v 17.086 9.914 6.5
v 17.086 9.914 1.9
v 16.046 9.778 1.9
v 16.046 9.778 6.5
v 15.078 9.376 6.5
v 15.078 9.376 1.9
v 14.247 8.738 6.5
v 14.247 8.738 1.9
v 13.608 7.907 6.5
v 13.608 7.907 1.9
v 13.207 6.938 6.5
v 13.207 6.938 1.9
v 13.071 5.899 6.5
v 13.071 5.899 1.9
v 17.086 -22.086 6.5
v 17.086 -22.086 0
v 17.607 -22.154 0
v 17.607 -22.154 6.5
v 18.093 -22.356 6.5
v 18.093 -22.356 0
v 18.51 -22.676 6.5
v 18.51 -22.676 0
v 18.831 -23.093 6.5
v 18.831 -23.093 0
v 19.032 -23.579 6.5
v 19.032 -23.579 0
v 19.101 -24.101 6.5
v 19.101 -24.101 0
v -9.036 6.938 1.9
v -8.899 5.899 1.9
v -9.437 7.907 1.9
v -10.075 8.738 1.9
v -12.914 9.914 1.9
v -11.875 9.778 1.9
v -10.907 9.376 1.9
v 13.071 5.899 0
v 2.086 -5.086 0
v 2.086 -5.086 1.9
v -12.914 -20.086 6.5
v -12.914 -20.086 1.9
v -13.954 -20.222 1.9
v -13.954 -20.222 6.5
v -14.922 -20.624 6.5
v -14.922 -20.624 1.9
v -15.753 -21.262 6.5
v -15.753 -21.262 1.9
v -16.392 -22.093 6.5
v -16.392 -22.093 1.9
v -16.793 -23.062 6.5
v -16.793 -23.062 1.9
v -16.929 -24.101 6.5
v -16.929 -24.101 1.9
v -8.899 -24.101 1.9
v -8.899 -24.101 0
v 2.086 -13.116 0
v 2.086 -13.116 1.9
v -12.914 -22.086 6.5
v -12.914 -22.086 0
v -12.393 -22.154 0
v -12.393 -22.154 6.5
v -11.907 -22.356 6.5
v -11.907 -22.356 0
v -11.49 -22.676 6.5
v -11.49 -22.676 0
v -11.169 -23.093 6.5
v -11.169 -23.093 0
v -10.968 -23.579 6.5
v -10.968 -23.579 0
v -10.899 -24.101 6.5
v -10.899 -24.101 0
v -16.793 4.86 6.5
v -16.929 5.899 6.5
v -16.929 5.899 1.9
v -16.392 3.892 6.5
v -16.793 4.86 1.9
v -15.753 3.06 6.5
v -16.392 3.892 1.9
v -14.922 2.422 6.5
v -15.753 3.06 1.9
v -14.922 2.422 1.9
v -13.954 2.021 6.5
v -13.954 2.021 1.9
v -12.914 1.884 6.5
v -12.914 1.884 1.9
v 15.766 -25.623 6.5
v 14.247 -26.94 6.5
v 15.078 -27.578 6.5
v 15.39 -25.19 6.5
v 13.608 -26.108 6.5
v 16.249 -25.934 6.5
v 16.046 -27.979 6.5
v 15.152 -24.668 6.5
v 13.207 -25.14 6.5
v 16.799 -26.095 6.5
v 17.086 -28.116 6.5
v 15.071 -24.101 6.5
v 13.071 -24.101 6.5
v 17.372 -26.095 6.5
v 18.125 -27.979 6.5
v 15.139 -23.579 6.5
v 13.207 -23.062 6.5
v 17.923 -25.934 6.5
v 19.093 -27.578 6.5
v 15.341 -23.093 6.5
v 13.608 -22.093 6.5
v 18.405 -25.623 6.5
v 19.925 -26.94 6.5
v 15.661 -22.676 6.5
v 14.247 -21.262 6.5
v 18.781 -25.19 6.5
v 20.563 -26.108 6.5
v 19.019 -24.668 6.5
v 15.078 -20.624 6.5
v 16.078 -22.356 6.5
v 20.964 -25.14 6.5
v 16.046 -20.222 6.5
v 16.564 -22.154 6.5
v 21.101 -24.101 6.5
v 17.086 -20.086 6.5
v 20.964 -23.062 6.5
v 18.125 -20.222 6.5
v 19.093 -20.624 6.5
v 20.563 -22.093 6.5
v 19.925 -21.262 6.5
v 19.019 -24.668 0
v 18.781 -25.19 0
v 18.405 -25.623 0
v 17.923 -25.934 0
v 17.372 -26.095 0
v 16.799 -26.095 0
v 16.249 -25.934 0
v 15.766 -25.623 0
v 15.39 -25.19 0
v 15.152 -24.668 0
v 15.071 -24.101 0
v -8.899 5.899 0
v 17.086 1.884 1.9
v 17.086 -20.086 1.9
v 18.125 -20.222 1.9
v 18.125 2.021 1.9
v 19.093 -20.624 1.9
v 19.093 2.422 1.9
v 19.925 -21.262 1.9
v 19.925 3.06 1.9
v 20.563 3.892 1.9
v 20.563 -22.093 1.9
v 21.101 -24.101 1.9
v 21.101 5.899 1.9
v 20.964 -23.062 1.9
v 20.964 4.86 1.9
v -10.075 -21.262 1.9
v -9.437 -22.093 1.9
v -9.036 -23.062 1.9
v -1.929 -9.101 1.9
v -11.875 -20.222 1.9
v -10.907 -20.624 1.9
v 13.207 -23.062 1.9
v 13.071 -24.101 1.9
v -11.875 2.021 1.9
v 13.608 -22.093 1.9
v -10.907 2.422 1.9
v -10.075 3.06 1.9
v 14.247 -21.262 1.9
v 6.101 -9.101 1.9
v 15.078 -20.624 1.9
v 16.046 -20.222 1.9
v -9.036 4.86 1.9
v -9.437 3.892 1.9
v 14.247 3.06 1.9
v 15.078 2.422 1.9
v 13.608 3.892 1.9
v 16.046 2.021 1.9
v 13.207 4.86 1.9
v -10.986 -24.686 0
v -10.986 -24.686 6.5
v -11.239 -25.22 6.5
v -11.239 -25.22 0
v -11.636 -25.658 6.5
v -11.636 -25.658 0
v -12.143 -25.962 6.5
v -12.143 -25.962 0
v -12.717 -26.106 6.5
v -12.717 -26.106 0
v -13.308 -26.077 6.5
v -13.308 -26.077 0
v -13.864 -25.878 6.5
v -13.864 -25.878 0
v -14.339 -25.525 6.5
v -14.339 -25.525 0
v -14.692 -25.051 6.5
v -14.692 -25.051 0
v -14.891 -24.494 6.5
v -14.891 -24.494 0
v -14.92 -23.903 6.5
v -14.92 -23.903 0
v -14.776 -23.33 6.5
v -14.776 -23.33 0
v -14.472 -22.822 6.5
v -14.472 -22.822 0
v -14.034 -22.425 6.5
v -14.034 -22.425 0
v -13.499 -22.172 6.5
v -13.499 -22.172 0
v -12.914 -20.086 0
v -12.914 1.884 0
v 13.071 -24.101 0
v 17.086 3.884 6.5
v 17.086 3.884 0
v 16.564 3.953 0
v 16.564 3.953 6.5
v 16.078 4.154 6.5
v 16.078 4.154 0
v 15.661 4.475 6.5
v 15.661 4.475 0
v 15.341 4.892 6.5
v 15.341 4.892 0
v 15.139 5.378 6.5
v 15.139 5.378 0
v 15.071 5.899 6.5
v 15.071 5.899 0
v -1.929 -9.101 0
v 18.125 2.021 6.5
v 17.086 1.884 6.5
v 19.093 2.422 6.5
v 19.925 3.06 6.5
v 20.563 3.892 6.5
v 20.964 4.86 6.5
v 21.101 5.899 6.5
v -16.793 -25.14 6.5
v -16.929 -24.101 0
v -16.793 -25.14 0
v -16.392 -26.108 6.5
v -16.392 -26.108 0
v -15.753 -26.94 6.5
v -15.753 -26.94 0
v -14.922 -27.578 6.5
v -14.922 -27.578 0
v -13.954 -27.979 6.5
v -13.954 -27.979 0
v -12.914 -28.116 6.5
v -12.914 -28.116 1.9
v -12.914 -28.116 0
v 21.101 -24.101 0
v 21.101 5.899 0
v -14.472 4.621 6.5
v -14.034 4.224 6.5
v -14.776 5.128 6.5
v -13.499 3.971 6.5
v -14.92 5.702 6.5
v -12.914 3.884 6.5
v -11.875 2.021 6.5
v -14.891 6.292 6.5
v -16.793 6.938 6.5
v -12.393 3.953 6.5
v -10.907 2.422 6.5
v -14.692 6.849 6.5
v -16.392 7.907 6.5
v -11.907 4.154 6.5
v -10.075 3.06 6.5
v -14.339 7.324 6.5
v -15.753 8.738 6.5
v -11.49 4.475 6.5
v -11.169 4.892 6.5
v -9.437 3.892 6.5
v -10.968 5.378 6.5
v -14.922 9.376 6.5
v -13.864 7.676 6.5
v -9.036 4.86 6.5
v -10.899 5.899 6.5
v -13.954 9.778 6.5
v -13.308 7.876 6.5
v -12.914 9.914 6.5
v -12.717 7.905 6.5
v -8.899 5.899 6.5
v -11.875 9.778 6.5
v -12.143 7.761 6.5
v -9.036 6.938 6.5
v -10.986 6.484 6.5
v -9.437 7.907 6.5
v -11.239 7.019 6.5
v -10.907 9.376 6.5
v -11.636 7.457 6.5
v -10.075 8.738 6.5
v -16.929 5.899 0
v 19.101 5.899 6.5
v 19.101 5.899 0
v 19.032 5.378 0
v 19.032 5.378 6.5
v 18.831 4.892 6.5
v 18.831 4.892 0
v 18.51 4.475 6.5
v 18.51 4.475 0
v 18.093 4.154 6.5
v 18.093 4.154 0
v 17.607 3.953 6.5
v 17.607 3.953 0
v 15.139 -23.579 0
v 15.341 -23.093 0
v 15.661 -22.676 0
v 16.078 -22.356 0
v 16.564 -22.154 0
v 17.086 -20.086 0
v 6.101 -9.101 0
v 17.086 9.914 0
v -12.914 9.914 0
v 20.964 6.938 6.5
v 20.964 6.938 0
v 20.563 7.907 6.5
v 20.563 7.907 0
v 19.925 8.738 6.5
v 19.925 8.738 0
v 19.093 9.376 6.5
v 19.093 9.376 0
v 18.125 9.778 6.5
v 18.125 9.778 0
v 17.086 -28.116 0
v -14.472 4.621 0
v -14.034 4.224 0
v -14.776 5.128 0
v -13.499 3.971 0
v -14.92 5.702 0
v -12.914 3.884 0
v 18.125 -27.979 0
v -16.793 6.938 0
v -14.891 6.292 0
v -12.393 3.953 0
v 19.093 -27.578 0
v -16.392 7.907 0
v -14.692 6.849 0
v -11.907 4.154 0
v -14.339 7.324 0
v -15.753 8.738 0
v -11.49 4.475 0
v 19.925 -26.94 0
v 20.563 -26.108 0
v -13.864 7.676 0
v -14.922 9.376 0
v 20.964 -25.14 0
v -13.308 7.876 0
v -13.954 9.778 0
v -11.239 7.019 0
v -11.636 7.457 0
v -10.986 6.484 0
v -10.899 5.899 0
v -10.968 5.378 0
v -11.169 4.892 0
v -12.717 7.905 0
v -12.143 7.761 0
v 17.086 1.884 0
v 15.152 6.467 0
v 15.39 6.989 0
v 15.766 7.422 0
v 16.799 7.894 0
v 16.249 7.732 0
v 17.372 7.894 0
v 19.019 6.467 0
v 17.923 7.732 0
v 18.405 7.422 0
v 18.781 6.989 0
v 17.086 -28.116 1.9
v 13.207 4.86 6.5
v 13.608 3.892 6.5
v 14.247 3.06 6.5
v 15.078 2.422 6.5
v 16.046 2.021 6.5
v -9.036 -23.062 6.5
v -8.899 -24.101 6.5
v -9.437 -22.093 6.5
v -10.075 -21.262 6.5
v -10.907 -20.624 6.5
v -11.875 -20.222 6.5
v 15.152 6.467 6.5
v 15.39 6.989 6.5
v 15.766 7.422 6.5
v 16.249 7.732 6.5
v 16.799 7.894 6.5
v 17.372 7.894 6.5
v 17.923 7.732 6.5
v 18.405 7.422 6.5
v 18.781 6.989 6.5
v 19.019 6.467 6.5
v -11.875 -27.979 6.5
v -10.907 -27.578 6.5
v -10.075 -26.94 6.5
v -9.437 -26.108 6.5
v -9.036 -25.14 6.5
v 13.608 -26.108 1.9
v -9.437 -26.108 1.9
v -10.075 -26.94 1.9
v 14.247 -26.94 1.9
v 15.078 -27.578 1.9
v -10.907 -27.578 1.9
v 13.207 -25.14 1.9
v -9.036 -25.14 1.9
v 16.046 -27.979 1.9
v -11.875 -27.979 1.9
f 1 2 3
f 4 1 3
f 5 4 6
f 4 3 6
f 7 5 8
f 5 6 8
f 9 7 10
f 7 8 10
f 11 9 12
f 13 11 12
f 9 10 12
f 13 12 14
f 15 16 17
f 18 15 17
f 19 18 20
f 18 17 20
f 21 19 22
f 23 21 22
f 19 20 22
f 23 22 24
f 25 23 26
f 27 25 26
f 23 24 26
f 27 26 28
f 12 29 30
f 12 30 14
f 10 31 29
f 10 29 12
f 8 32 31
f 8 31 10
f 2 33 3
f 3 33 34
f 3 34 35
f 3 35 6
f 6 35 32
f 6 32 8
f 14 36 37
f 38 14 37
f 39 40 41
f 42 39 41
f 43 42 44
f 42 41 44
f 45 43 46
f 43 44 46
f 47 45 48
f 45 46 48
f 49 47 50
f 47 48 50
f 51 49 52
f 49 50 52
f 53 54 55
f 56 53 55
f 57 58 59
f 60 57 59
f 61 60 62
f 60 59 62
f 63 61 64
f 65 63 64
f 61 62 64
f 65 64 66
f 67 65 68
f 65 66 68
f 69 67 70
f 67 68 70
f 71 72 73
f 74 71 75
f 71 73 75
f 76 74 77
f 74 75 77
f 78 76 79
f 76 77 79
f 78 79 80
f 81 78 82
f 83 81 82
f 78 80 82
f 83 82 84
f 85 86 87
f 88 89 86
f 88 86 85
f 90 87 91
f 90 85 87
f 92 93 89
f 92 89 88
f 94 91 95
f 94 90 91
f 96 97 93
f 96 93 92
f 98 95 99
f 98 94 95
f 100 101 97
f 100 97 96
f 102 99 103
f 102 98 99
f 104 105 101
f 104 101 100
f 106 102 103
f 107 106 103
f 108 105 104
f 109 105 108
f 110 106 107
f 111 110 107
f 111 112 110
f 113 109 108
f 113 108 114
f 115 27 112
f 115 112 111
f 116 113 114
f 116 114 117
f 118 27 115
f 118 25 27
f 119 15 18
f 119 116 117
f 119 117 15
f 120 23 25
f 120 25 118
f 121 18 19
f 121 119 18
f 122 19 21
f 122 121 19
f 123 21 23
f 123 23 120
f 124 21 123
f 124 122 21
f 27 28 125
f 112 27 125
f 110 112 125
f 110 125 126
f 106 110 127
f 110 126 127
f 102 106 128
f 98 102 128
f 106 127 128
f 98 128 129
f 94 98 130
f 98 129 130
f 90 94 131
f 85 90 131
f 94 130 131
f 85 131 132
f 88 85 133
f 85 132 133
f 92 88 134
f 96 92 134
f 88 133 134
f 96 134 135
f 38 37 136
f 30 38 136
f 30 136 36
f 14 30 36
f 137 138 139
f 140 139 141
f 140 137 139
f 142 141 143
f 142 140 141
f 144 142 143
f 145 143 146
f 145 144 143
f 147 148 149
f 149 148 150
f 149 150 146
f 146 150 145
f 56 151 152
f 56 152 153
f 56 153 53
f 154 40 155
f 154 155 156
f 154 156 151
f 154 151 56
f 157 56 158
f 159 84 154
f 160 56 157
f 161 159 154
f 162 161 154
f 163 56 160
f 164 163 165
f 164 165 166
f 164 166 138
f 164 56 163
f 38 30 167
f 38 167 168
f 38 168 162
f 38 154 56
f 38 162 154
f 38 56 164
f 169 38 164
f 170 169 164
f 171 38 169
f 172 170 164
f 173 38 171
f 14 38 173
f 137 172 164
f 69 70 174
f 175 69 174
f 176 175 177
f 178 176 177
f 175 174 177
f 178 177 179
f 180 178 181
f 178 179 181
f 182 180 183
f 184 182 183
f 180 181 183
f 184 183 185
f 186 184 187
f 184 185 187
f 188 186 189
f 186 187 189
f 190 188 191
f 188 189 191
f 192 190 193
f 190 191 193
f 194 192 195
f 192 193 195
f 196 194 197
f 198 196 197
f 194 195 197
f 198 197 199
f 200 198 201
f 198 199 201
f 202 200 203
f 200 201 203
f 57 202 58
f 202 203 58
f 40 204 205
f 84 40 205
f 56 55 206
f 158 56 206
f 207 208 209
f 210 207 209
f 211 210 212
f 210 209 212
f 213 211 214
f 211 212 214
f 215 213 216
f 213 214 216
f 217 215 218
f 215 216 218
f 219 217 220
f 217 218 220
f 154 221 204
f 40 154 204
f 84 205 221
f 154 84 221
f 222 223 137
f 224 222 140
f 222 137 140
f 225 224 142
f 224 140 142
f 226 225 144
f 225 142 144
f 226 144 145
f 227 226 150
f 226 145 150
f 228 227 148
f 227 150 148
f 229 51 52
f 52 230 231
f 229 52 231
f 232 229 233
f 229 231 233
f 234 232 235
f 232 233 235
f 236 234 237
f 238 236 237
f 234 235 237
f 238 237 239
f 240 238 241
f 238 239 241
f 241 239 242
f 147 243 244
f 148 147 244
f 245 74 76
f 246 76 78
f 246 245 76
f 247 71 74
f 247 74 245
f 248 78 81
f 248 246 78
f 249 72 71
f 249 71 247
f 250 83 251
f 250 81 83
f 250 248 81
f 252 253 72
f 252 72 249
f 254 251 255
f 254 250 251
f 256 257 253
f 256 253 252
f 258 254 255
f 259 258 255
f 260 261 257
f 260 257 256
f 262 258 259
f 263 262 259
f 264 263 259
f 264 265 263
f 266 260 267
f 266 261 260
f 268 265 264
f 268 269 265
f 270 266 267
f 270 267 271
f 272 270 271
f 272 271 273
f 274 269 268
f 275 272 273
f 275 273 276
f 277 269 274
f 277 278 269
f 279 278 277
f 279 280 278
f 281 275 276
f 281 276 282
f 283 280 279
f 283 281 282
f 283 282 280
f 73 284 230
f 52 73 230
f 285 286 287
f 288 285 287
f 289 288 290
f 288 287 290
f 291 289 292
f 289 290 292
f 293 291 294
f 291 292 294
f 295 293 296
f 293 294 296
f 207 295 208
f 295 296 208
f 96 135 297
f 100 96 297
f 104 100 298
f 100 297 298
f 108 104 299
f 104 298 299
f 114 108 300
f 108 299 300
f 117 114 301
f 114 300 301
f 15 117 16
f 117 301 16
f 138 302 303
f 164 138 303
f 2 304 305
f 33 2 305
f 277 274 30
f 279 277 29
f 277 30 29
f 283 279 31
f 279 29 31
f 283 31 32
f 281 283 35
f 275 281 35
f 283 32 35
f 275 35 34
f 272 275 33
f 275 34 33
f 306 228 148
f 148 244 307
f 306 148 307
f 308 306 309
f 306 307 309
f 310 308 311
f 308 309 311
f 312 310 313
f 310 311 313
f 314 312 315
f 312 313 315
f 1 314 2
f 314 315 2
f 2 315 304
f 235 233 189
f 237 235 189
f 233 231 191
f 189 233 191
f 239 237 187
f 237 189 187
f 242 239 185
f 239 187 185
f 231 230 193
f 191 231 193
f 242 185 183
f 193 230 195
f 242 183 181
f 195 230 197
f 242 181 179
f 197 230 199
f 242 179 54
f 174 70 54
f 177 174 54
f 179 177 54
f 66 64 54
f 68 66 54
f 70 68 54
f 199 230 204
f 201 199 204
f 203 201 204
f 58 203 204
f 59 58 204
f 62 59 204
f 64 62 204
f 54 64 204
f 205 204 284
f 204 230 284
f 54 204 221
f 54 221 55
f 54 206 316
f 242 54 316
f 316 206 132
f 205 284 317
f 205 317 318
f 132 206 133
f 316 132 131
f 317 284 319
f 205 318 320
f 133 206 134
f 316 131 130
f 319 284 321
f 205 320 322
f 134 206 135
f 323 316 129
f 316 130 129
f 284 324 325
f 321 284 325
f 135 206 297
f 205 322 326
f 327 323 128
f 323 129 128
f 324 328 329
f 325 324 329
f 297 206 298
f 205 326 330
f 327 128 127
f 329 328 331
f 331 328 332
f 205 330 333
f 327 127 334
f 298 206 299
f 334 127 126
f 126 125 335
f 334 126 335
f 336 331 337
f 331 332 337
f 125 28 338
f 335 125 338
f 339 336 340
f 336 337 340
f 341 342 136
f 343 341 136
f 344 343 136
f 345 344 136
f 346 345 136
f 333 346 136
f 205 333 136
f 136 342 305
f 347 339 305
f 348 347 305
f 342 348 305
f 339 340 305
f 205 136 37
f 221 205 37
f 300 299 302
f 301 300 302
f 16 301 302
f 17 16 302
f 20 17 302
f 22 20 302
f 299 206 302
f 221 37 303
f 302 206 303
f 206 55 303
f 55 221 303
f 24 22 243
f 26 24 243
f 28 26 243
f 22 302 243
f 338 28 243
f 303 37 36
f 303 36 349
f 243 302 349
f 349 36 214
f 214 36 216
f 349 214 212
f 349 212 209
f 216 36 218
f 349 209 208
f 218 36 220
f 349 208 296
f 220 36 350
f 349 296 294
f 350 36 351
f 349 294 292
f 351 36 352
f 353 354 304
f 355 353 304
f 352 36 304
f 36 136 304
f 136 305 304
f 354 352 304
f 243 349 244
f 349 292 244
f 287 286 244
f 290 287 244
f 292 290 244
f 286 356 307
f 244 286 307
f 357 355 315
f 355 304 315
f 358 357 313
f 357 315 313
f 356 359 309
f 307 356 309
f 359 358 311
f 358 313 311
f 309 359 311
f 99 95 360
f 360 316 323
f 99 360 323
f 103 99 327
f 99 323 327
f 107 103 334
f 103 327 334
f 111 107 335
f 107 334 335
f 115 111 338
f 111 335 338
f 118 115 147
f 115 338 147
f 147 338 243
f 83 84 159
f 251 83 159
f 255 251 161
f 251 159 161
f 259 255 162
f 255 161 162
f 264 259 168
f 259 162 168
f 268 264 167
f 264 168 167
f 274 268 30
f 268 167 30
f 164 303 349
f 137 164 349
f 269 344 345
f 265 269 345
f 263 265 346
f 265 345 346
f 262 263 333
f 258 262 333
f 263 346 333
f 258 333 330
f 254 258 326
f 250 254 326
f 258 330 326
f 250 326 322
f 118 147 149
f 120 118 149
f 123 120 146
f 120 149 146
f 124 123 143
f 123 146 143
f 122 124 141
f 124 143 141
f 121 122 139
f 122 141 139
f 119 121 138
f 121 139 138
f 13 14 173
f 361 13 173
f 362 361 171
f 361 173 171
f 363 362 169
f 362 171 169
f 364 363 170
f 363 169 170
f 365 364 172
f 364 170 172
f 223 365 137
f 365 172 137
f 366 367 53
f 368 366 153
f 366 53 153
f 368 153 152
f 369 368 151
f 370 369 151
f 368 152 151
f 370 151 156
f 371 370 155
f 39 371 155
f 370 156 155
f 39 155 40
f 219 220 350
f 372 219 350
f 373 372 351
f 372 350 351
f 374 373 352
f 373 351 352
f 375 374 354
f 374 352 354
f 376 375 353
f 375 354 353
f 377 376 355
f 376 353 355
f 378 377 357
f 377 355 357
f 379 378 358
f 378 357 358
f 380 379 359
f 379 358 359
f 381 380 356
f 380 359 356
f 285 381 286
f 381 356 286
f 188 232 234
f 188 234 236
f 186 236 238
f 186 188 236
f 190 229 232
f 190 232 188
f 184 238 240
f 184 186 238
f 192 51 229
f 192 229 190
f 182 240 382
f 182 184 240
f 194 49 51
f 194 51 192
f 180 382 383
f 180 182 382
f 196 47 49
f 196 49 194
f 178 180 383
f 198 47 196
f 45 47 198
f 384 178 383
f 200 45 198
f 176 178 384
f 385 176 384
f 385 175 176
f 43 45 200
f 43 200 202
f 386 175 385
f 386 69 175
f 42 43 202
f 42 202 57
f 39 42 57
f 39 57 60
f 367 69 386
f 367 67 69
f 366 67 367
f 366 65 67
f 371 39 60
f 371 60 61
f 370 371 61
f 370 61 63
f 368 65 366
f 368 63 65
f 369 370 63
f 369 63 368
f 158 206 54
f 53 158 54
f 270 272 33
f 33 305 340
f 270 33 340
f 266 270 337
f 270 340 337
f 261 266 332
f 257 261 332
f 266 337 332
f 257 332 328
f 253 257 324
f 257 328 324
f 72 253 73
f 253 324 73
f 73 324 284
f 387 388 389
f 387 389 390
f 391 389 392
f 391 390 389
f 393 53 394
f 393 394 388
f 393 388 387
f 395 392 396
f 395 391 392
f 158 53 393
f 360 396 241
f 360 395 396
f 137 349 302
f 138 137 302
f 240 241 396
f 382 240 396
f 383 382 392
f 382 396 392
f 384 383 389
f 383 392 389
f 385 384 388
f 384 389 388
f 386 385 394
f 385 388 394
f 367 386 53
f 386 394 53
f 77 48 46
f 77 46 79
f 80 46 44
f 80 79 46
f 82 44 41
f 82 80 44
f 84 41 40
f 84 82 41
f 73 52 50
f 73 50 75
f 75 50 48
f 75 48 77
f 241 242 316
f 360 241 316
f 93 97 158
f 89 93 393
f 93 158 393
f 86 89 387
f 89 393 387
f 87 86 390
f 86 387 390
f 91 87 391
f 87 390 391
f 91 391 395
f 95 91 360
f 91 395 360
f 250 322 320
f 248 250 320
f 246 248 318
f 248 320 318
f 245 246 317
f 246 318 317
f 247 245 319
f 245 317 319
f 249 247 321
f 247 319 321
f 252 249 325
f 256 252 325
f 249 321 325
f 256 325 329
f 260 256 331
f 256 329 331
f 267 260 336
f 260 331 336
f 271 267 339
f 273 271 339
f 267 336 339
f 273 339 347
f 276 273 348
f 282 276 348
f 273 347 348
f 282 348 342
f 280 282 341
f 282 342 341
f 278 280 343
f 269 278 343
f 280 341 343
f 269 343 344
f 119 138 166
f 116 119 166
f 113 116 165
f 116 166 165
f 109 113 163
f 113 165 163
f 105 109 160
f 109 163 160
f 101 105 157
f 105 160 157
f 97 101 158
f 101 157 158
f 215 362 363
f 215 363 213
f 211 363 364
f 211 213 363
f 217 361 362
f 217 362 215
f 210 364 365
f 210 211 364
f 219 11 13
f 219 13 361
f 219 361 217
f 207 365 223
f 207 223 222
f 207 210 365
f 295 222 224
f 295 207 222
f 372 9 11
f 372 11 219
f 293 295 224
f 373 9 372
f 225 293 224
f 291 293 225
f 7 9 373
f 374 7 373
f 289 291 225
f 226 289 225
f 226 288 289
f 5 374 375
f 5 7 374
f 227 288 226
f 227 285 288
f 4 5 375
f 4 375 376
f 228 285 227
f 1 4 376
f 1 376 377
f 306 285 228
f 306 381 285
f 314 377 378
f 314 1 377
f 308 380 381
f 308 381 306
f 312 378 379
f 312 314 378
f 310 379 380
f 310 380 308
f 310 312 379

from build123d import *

# Parameters (mm, degrees)
F1_DEPTH = 6.5
F2_DEPTH = 1.9


with BuildPart() as f1:
    # F0 (on Top) → F1 (new body)
    with BuildSketch(Plane.XY):
        with BuildLine():
            Line((-8.899431151, 5.8993360586), (-10.899431151, 5.8993360586))
            ThreePointArc((-10.899431151, 5.8993360586), (-11.4896109869, 4.4745158946), (-12.914431151, 3.8843360586))
            Line((-12.914431151, 3.8843360586), (-12.914431151, 1.8843360586))
            ThreePointArc((-12.914431151, 1.8843360586), (-10.0753974245, 3.0603023322), (-8.899431151, 5.8993360586))
        make_face()
        with BuildLine():
            ThreePointArc((-12.914431151, 3.8843360586), (-14.3392513151, 7.3241562227), (-10.899431151, 5.8993360586))
            Line((-10.899431151, 5.8993360586), (-8.899431151, 5.8993360586))
            ThreePointArc((-8.899431151, 5.8993360586), (-10.0753974245, 8.7383697851), (-12.914431151, 9.9143360586))
            ThreePointArc((-12.914431151, 9.9143360586), (-15.7534648775, 8.7383697851), (-16.929431151, 5.8993360586))
            ThreePointArc((-16.929431151, 5.8993360586), (-15.7534648775, 3.0603023322), (-12.914431151, 1.8843360586))
            Line((-12.914431151, 1.8843360586), (-12.914431151, 3.8843360586))
        make_face()
    extrude(amount=F1_DEPTH)



with BuildPart() as f1b:
    # F0 (on Top) → F1, piece 2 (new body)
    with BuildSketch(Plane.XY):
        with BuildLine():
            ThreePointArc((17.085568849, 9.9143360586), (14.2465351225, 8.7383697851), (13.070568849, 5.8993360586))
            Line((13.070568849, 5.8993360586), (15.070568849, 5.8993360586))
            ThreePointArc((15.070568849, 5.8993360586), (17.085568849, 7.9143360586), (19.100568849, 5.8993360586))
            ThreePointArc((19.100568849, 5.8993360586), (18.5103890131, 4.4745158946), (17.085568849, 3.8843360586))
            Line((17.085568849, 3.8843360586), (17.085568849, 1.8843360586))
            ThreePointArc((17.085568849, 1.8843360586), (19.9246025755, 3.0603023322), (21.100568849, 5.8993360586))
            ThreePointArc((21.100568849, 5.8993360586), (19.9246025755, 8.7383697851), (17.085568849, 9.9143360586))
        make_face()
        with BuildLine():
            Line((15.070568849, 5.8993360586), (13.070568849, 5.8993360586))
            ThreePointArc((13.070568849, 5.8993360586), (14.2465351225, 3.0603023322), (17.085568849, 1.8843360586))
            Line((17.085568849, 1.8843360586), (17.085568849, 3.8843360586))
            ThreePointArc((17.085568849, 3.8843360586), (15.6607486849, 4.4745158946), (15.070568849, 5.8993360586))
        make_face()
    extrude(amount=F1_DEPTH)


with BuildPart() as f1c:
    # F0 (on Top) → F1, piece 3 (new body)
    with BuildSketch(Plane.XY):
        with BuildLine():
            ThreePointArc((21.100568849, -24.1006639414), (19.9246025755, -21.2616302149), (17.085568849, -20.0856639414))
            Line((17.085568849, -20.0856639414), (17.085568849, -22.0856639414))
            ThreePointArc((17.085568849, -22.0856639414), (18.5103890131, -22.6758437773), (19.100568849, -24.1006639414))
            ThreePointArc((19.100568849, -24.1006639414), (17.085568849, -26.1156639414), (15.070568849, -24.1006639414))
            Line((15.070568849, -24.1006639414), (13.070568849, -24.1006639414))
            ThreePointArc((13.070568849, -24.1006639414), (14.2465351225, -26.9396976678), (17.085568849, -28.1156639414))
            ThreePointArc((17.085568849, -28.1156639414), (19.9246025755, -26.9396976678), (21.100568849, -24.1006639414))
        make_face()
        with BuildLine():
            Line((17.085568849, -22.0856639414), (17.085568849, -20.0856639414))
            ThreePointArc((17.085568849, -20.0856639414), (14.2465351225, -21.2616302149), (13.070568849, -24.1006639414))
            Line((13.070568849, -24.1006639414), (15.070568849, -24.1006639414))
            ThreePointArc((15.070568849, -24.1006639414), (15.6607486849, -22.6758437773), (17.085568849, -22.0856639414))
        make_face()
    extrude(amount=F1_DEPTH)


with BuildPart() as f1d:
    # F0 (on Top) → F1, piece 4 (new body)
    with BuildSketch(Plane.XY):
        with BuildLine():
            Line((-12.914431151, -22.0856639414), (-12.914431151, -20.0856639414))
            ThreePointArc((-12.914431151, -20.0856639414), (-15.7534648775, -21.2616302149), (-16.929431151, -24.1006639414))
            ThreePointArc((-16.929431151, -24.1006639414), (-15.7534648775, -26.9396976678), (-12.914431151, -28.1156639414))
            ThreePointArc((-12.914431151, -28.1156639414), (-10.0753974245, -26.9396976678), (-8.899431151, -24.1006639414))
            Line((-8.899431151, -24.1006639414), (-10.899431151, -24.1006639414))
            ThreePointArc((-10.899431151, -24.1006639414), (-14.3392513151, -25.5254841054), (-12.914431151, -22.0856639414))
        make_face()
        with BuildLine():
            ThreePointArc((-8.899431151, -24.1006639414), (-10.0753974245, -21.2616302149), (-12.914431151, -20.0856639414))
            Line((-12.914431151, -20.0856639414), (-12.914431151, -22.0856639414))
            ThreePointArc((-12.914431151, -22.0856639414), (-11.4896109869, -22.6758437773), (-10.899431151, -24.1006639414))
            Line((-10.899431151, -24.1006639414), (-8.899431151, -24.1006639414))
        make_face()
    extrude(amount=F1_DEPTH)


with BuildPart() as f1_1:
    add(f1.part)

    add(f1b.part)  # F2 merges F1b

    add(f1c.part)  # F2 merges F1c

    add(f1d.part)  # F2 merges F1d
    # F0 (on Top) → F2 (join)
    with BuildSketch(Plane.XY):
        with BuildLine():
            ThreePointArc((-12.914431151, 3.8843360586), (-14.3392513151, 7.3241562227), (-10.899431151, 5.8993360586))
            Line((-10.899431151, 5.8993360586), (-8.899431151, 5.8993360586))
            ThreePointArc((-8.899431151, 5.8993360586), (-10.0753974245, 8.7383697851), (-12.914431151, 9.9143360586))
            ThreePointArc((-12.914431151, 9.9143360586), (-15.7534648775, 8.7383697851), (-16.929431151, 5.8993360586))
            ThreePointArc((-16.929431151, 5.8993360586), (-15.7534648775, 3.0603023322), (-12.914431151, 1.8843360586))
            Line((-12.914431151, 1.8843360586), (-12.914431151, 3.8843360586))
        make_face()
        with BuildLine():
            ThreePointArc((-12.914431151, 9.9143360586), (-10.0753974245, 8.7383697851), (-8.899431151, 5.8993360586))
            Line((-8.899431151, 5.8993360586), (13.070568849, 5.8993360586))
            ThreePointArc((13.070568849, 5.8993360586), (14.2465351225, 8.7383697851), (17.085568849, 9.9143360586))
            Line((17.085568849, 9.9143360586), (-12.914431151, 9.9143360586))
        make_face()
        with BuildLine():
            Line((-12.914431151, -20.0856639414), (-12.914431151, 1.8843360586))
            ThreePointArc((-12.914431151, 1.8843360586), (-15.7534648775, 3.0603023322), (-16.929431151, 5.8993360586))
            Line((-16.929431151, 5.8993360586), (-16.929431151, -24.1006639414))
            ThreePointArc((-16.929431151, -24.1006639414), (-15.7534648775, -21.2616302149), (-12.914431151, -20.0856639414))
        make_face()
        with BuildLine():
            ThreePointArc((17.085568849, 9.9143360586), (14.2465351225, 8.7383697851), (13.070568849, 5.8993360586))
            Line((13.070568849, 5.8993360586), (15.070568849, 5.8993360586))
            ThreePointArc((15.070568849, 5.8993360586), (17.085568849, 7.9143360586), (19.100568849, 5.8993360586))
            ThreePointArc((19.100568849, 5.8993360586), (18.5103890131, 4.4745158946), (17.085568849, 3.8843360586))
            Line((17.085568849, 3.8843360586), (17.085568849, 1.8843360586))
            ThreePointArc((17.085568849, 1.8843360586), (19.9246025755, 3.0603023322), (21.100568849, 5.8993360586))
            ThreePointArc((21.100568849, 5.8993360586), (19.9246025755, 8.7383697851), (17.085568849, 9.9143360586))
        make_face()
        with BuildLine():
            Line((-12.914431151, -22.0856639414), (-12.914431151, -20.0856639414))
            ThreePointArc((-12.914431151, -20.0856639414), (-15.7534648775, -21.2616302149), (-16.929431151, -24.1006639414))
            ThreePointArc((-16.929431151, -24.1006639414), (-15.7534648775, -26.9396976678), (-12.914431151, -28.1156639414))
            ThreePointArc((-12.914431151, -28.1156639414), (-10.0753974245, -26.9396976678), (-8.899431151, -24.1006639414))
            Line((-8.899431151, -24.1006639414), (-10.899431151, -24.1006639414))
            ThreePointArc((-10.899431151, -24.1006639414), (-14.3392513151, -25.5254841054), (-12.914431151, -22.0856639414))
        make_face()
        with BuildLine():
            ThreePointArc((21.100568849, 5.8993360586), (19.9246025755, 3.0603023322), (17.085568849, 1.8843360586))
            Line((17.085568849, 1.8843360586), (17.085568849, -20.0856639414))
            ThreePointArc((17.085568849, -20.0856639414), (19.9246025755, -21.2616302149), (21.100568849, -24.1006639414))
            Line((21.100568849, -24.1006639414), (21.100568849, 5.8993360586))
        make_face()
        with BuildLine():
            Line((13.070568849, -24.1006639414), (-8.899431151, -24.1006639414))
            ThreePointArc((-8.899431151, -24.1006639414), (-10.0753974245, -26.9396976678), (-12.914431151, -28.1156639414))
            Line((-12.914431151, -28.1156639414), (17.085568849, -28.1156639414))
            ThreePointArc((17.085568849, -28.1156639414), (14.2465351225, -26.9396976678), (13.070568849, -24.1006639414))
        make_face()
        with BuildLine():
            ThreePointArc((21.100568849, -24.1006639414), (19.9246025755, -21.2616302149), (17.085568849, -20.0856639414))
            Line((17.085568849, -20.0856639414), (17.085568849, -22.0856639414))
            ThreePointArc((17.085568849, -22.0856639414), (18.5103890131, -22.6758437773), (19.100568849, -24.1006639414))
            ThreePointArc((19.100568849, -24.1006639414), (17.085568849, -26.1156639414), (15.070568849, -24.1006639414))
            Line((15.070568849, -24.1006639414), (13.070568849, -24.1006639414))
            ThreePointArc((13.070568849, -24.1006639414), (14.2465351225, -26.9396976678), (17.085568849, -28.1156639414))
            ThreePointArc((17.085568849, -28.1156639414), (19.9246025755, -26.9396976678), (21.100568849, -24.1006639414))
        make_face()
        with BuildLine():
            Line((2.085568849, -5.0856639414), (-8.899431151, 5.8993360586))
            ThreePointArc((-8.899431151, 5.8993360586), (-10.0753974245, 3.0603023322), (-12.914431151, 1.8843360586))
            Line((-12.914431151, 1.8843360586), (-1.929431151, -9.1006639414))
            Line((-1.929431151, -9.1006639414), (2.085568849, -5.0856639414))
        make_face()
        with BuildLine():
            ThreePointArc((17.085568849, 1.8843360586), (14.2465351225, 3.0603023322), (13.070568849, 5.8993360586))
            Line((13.070568849, 5.8993360586), (2.085568849, -5.0856639414))
            Line((2.085568849, -5.0856639414), (6.100568849, -9.1006639414))
            Line((6.100568849, -9.1006639414), (17.085568849, 1.8843360586))
        make_face()
        Polygon((6.100568849, -9.1006639414), (2.085568849, -5.0856639414), (-1.929431151, -9.1006639414), (2.085568849, -13.1156639414), align=None)
        with BuildLine():
            Line((17.085568849, -20.0856639414), (6.100568849, -9.1006639414))
            Line((6.100568849, -9.1006639414), (2.085568849, -13.1156639414))
            Line((2.085568849, -13.1156639414), (13.070568849, -24.1006639414))
            ThreePointArc((13.070568849, -24.1006639414), (14.2465351225, -21.2616302149), (17.085568849, -20.0856639414))
        make_face()
        with BuildLine():
            Line((-1.929431151, -9.1006639414), (-12.914431151, -20.0856639414))
            ThreePointArc((-12.914431151, -20.0856639414), (-10.0753974245, -21.2616302149), (-8.899431151, -24.1006639414))
            Line((-8.899431151, -24.1006639414), (2.085568849, -13.1156639414))
            Line((2.085568849, -13.1156639414), (-1.929431151, -9.1006639414))
        make_face()
    extrude(amount=F2_DEPTH)


solid = f1_1.part
